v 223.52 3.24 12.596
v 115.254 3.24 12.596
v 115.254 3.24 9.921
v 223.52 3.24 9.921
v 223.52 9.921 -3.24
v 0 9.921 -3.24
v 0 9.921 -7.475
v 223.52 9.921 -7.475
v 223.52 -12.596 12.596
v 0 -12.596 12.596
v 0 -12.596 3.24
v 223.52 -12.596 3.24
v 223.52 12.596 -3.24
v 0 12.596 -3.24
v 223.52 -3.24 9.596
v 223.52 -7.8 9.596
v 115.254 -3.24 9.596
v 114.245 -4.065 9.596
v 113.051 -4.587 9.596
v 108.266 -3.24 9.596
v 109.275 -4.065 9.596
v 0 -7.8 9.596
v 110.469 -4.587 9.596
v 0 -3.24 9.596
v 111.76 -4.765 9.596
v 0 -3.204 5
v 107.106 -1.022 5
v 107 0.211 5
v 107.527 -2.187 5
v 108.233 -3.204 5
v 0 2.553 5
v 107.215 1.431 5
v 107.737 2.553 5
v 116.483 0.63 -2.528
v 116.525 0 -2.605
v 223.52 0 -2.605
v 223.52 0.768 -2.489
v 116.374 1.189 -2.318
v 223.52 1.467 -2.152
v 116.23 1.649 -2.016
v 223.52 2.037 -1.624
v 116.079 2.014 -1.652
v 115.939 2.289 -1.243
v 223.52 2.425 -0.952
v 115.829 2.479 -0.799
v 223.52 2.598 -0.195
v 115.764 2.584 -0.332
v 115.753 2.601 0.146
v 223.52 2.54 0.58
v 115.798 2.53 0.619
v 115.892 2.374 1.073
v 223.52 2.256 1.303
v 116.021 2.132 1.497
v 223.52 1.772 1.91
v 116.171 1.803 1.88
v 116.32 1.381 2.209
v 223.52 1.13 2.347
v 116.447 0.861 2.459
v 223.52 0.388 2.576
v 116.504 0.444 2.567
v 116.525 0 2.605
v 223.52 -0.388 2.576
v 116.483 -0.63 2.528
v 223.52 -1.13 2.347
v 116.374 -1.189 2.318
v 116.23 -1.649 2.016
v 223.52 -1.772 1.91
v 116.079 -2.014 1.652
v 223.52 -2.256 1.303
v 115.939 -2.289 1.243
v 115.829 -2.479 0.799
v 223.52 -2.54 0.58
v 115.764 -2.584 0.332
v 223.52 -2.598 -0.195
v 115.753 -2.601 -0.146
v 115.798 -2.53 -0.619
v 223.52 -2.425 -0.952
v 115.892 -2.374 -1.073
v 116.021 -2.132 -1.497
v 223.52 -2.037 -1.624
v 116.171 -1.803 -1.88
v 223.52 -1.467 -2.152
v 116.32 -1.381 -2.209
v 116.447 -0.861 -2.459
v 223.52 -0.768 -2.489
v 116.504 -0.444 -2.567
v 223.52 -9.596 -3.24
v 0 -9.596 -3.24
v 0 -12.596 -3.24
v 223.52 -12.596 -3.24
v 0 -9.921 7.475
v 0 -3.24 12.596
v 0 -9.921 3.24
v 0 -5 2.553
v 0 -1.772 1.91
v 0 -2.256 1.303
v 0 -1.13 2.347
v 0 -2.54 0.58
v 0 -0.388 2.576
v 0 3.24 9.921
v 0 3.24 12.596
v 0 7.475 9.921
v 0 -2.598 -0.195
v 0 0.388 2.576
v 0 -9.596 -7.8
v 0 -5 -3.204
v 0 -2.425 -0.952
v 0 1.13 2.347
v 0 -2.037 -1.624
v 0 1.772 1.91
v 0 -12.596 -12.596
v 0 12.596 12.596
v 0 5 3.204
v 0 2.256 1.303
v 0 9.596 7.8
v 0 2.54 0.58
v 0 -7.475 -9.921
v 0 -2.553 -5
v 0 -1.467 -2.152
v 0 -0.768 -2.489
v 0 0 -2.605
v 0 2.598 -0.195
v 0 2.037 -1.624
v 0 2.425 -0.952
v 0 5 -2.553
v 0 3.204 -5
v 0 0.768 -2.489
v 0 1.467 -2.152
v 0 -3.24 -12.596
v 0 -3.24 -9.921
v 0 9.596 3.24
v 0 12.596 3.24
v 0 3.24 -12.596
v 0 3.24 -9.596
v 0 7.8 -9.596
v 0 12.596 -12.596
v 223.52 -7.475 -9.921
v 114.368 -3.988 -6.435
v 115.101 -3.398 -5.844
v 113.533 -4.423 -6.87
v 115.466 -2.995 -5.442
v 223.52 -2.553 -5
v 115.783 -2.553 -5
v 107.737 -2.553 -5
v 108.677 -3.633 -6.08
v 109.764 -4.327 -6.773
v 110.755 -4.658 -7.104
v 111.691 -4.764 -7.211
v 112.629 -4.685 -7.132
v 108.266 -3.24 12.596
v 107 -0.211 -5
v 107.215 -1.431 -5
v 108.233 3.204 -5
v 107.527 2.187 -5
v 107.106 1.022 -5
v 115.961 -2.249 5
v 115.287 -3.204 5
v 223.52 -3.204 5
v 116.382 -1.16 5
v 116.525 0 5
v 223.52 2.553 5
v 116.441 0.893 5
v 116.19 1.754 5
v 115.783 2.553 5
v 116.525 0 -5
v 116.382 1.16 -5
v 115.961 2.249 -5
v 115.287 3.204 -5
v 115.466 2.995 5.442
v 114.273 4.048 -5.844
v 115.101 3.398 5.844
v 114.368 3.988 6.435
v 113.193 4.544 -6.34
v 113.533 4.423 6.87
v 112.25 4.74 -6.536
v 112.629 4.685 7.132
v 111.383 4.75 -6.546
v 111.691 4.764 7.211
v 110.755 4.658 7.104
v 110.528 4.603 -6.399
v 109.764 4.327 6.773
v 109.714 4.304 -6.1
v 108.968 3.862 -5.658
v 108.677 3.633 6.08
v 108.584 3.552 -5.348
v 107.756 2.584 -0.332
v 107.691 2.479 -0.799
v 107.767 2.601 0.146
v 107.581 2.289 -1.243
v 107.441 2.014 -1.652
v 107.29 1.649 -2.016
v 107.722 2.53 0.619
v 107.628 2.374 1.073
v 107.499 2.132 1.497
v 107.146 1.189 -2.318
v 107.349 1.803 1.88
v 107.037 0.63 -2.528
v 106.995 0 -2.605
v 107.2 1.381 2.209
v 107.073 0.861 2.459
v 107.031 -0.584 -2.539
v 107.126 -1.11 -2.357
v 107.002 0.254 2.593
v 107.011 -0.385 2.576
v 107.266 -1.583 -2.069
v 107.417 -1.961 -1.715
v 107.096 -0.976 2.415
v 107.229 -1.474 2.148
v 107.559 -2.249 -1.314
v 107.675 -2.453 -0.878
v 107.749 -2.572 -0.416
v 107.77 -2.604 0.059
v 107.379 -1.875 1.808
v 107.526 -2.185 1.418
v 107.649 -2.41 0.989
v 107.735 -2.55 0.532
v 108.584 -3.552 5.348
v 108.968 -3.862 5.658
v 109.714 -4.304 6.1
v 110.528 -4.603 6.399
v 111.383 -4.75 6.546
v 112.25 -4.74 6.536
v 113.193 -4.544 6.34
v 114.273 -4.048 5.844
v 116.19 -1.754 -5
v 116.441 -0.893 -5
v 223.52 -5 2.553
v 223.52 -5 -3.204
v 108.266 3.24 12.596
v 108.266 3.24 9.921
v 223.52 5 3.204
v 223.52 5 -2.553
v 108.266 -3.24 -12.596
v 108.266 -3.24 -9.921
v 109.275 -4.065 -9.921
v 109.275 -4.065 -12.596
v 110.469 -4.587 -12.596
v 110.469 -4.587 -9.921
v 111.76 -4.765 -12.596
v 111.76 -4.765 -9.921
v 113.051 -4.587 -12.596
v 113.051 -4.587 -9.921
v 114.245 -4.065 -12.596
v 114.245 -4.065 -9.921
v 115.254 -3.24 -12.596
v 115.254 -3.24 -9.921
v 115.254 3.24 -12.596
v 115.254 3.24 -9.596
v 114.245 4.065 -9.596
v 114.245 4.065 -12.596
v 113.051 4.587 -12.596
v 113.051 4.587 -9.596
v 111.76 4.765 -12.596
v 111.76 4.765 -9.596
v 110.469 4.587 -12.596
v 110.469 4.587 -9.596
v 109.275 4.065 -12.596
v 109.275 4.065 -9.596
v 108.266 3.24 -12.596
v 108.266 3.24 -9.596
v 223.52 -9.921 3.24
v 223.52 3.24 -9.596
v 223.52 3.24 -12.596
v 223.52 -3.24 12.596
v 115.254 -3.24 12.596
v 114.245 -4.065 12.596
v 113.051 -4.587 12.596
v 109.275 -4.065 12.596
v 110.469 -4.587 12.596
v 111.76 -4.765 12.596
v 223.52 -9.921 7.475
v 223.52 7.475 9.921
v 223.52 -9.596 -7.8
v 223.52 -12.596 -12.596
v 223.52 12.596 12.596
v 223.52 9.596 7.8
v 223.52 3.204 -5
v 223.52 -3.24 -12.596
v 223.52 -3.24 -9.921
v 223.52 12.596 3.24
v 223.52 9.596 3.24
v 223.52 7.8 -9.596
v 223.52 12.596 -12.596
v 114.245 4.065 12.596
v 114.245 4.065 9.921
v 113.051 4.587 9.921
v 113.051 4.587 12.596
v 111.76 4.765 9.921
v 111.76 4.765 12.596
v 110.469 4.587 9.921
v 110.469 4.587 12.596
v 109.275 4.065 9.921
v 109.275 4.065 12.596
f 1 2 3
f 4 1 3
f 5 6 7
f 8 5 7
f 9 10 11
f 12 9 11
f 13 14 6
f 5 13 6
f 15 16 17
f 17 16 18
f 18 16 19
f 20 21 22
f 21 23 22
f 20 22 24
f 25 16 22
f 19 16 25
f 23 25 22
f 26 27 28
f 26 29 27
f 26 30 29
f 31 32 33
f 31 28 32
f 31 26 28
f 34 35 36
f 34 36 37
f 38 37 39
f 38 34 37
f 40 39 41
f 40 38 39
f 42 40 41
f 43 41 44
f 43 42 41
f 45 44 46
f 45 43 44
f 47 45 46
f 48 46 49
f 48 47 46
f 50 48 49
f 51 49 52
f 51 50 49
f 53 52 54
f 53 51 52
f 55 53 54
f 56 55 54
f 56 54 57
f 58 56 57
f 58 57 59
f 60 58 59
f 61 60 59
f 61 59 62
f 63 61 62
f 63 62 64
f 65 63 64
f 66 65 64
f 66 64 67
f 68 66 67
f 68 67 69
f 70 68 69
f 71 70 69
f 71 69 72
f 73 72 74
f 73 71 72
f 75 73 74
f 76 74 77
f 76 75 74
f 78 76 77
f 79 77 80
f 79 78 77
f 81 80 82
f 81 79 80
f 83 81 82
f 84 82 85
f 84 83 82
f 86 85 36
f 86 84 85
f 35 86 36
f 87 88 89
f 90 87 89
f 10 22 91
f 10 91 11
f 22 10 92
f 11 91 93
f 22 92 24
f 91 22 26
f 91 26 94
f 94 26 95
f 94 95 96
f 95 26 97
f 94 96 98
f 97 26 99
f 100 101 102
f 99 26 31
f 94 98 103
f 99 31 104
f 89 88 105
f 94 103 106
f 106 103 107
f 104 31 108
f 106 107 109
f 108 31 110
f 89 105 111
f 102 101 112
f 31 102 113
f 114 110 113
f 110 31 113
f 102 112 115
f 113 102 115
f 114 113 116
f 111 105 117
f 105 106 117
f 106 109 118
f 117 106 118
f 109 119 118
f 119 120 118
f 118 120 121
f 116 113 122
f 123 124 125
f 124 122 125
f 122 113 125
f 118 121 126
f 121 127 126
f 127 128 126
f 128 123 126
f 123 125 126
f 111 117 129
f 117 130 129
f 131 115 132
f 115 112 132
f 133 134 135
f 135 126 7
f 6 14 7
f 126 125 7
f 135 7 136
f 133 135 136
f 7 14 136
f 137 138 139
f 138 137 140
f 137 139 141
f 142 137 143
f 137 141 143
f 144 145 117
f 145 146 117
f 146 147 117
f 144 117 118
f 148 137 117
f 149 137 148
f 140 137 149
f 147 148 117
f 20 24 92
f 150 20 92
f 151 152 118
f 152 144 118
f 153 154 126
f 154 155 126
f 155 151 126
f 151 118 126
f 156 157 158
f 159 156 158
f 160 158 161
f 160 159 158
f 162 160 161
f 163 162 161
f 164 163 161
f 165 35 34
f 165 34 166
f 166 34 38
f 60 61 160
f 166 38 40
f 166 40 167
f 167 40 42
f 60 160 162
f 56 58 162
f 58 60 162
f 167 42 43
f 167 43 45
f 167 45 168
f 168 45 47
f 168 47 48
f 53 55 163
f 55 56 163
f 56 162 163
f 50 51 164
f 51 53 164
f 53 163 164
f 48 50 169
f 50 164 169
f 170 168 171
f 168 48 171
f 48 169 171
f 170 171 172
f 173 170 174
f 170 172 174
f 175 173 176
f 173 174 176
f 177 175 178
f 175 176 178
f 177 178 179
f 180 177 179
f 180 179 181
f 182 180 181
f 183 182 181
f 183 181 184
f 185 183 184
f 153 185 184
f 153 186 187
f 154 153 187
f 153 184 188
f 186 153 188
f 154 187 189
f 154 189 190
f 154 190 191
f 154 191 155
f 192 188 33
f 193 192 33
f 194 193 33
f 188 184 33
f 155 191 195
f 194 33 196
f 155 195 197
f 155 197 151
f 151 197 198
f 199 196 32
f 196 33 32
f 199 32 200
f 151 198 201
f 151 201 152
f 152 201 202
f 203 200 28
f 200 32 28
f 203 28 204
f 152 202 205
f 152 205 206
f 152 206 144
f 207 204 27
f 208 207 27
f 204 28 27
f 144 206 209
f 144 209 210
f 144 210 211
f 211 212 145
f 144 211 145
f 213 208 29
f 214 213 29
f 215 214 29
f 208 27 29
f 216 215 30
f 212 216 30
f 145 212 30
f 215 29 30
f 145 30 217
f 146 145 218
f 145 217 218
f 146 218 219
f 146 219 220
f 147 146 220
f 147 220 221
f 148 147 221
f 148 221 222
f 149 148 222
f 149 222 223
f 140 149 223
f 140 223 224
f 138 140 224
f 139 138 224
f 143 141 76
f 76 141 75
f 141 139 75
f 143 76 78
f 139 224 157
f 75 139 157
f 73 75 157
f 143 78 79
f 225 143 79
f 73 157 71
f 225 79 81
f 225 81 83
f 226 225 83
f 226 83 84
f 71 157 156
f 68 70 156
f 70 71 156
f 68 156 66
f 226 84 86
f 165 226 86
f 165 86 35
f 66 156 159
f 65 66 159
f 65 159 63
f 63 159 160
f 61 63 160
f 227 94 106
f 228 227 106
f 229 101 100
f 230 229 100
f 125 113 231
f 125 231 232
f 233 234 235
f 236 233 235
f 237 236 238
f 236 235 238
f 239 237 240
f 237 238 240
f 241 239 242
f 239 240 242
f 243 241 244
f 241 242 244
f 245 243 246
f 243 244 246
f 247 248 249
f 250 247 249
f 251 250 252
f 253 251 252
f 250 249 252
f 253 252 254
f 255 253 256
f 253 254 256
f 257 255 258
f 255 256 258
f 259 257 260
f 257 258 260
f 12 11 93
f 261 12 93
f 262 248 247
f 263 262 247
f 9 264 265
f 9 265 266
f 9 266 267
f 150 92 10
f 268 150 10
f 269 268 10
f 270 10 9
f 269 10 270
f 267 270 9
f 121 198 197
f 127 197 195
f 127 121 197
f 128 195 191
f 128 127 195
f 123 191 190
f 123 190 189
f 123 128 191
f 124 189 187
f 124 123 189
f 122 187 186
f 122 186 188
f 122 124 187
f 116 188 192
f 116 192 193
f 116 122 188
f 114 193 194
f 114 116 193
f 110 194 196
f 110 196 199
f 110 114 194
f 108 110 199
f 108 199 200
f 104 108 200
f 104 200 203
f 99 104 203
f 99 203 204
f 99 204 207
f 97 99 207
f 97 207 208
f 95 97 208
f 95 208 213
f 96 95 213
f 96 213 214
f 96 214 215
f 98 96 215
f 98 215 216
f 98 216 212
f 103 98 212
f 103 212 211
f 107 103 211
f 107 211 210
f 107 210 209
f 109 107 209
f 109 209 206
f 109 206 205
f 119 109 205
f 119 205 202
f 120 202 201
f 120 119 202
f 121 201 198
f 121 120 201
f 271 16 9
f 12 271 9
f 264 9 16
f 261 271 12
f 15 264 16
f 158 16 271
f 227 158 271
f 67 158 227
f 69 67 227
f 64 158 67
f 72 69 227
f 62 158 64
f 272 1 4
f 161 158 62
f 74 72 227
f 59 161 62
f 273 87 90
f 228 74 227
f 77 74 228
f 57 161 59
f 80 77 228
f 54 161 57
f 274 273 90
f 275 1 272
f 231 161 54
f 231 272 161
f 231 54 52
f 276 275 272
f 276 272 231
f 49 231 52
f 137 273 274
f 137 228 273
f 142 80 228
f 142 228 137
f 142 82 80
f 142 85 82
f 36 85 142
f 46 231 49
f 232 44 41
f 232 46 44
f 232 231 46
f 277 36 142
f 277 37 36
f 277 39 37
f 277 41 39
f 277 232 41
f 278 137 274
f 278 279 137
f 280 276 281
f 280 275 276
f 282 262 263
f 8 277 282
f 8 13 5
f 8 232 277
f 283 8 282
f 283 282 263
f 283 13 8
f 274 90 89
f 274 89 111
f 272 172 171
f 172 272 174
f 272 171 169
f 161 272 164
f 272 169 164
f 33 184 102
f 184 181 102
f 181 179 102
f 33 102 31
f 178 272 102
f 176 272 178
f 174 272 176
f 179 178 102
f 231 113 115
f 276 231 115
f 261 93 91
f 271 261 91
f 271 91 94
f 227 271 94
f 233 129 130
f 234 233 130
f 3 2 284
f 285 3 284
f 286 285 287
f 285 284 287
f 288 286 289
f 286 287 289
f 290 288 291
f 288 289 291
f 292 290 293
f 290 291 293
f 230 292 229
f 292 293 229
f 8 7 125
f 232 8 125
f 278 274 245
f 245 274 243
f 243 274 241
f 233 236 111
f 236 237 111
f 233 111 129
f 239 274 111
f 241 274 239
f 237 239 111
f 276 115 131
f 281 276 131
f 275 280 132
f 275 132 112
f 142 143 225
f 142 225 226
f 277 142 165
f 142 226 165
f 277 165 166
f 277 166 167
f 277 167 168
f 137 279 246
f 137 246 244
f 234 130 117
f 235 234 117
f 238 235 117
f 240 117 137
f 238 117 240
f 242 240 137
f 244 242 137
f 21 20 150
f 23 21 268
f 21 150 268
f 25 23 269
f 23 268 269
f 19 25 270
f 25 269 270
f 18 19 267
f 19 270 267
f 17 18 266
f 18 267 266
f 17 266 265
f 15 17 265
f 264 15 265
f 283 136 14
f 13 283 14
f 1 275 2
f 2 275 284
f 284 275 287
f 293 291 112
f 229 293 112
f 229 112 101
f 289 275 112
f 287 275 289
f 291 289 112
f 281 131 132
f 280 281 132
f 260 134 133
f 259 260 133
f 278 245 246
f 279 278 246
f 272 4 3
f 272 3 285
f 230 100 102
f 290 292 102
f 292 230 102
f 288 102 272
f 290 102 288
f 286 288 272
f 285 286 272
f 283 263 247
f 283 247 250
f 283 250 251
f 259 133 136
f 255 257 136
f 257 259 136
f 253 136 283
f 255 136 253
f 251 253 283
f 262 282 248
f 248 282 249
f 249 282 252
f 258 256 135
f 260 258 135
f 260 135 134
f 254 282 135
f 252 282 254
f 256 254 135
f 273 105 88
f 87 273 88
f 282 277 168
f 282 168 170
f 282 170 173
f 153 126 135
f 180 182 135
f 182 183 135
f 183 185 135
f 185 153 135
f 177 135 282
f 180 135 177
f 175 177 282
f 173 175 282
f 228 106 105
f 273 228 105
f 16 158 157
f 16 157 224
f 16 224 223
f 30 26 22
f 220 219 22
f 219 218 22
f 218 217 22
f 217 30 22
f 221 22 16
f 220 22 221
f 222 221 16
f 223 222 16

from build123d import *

# Parameters (mm, degrees)
SKETCH1_R               = 2.605
BOSS_EXTRUDE1_DEPTH     = 223.52
CIRPATTERN1_COUNT       = 4
CUT_EXTRUDE2_DEPTH      = 10
CUT_EXTRUDE2_DEPTH_BACK = 50
SKETCH2_R               = 4.765


with BuildPart() as part:
    # Sketch1 → Boss-Extrude1 (new body)
    with BuildSketch(Plane(origin=(0, 0, 0), x_dir=(0, 0, -1), z_dir=(1, 0, 0))):
        Polygon((5, -5), (5, 3.203948776), (9.596194078, 7.800142853), (9.596194078, 3.24), (12.596194078, 3.24), (12.596194078, 12.596194078), (3.24, 12.596194078), (3.24, 9.921463197), (7.474873734, 9.921463197), (2.553410537, 5), (-5, 5), (-5, -5), align=None)
        Circle(SKETCH1_R, mode=Mode.SUBTRACT)
    boss_extrude1 = extrude(amount=BOSS_EXTRUDE1_DEPTH)

    # CirPattern1: Boss-Extrude1 ×4 about axis
    cirpattern1_axis = Axis((0, 0, 0), (1, 0, 0))
    for i in range(1, CIRPATTERN1_COUNT):
        add(boss_extrude1.rotate(cirpattern1_axis, i * 360 / CIRPATTERN1_COUNT))

    # Sketch2 → Cut-Extrude2 (cut, two sides: drawn at the far end of the back side and taken through both)
    with BuildSketch(Plane.XY.offset(12.596194078).offset(-CUT_EXTRUDE2_DEPTH_BACK)):
        with Locations((111.76, 0)):
            Circle(SKETCH2_R)
    extrude(amount=CUT_EXTRUDE2_DEPTH + CUT_EXTRUDE2_DEPTH_BACK, mode=Mode.SUBTRACT)


solid = part.part
